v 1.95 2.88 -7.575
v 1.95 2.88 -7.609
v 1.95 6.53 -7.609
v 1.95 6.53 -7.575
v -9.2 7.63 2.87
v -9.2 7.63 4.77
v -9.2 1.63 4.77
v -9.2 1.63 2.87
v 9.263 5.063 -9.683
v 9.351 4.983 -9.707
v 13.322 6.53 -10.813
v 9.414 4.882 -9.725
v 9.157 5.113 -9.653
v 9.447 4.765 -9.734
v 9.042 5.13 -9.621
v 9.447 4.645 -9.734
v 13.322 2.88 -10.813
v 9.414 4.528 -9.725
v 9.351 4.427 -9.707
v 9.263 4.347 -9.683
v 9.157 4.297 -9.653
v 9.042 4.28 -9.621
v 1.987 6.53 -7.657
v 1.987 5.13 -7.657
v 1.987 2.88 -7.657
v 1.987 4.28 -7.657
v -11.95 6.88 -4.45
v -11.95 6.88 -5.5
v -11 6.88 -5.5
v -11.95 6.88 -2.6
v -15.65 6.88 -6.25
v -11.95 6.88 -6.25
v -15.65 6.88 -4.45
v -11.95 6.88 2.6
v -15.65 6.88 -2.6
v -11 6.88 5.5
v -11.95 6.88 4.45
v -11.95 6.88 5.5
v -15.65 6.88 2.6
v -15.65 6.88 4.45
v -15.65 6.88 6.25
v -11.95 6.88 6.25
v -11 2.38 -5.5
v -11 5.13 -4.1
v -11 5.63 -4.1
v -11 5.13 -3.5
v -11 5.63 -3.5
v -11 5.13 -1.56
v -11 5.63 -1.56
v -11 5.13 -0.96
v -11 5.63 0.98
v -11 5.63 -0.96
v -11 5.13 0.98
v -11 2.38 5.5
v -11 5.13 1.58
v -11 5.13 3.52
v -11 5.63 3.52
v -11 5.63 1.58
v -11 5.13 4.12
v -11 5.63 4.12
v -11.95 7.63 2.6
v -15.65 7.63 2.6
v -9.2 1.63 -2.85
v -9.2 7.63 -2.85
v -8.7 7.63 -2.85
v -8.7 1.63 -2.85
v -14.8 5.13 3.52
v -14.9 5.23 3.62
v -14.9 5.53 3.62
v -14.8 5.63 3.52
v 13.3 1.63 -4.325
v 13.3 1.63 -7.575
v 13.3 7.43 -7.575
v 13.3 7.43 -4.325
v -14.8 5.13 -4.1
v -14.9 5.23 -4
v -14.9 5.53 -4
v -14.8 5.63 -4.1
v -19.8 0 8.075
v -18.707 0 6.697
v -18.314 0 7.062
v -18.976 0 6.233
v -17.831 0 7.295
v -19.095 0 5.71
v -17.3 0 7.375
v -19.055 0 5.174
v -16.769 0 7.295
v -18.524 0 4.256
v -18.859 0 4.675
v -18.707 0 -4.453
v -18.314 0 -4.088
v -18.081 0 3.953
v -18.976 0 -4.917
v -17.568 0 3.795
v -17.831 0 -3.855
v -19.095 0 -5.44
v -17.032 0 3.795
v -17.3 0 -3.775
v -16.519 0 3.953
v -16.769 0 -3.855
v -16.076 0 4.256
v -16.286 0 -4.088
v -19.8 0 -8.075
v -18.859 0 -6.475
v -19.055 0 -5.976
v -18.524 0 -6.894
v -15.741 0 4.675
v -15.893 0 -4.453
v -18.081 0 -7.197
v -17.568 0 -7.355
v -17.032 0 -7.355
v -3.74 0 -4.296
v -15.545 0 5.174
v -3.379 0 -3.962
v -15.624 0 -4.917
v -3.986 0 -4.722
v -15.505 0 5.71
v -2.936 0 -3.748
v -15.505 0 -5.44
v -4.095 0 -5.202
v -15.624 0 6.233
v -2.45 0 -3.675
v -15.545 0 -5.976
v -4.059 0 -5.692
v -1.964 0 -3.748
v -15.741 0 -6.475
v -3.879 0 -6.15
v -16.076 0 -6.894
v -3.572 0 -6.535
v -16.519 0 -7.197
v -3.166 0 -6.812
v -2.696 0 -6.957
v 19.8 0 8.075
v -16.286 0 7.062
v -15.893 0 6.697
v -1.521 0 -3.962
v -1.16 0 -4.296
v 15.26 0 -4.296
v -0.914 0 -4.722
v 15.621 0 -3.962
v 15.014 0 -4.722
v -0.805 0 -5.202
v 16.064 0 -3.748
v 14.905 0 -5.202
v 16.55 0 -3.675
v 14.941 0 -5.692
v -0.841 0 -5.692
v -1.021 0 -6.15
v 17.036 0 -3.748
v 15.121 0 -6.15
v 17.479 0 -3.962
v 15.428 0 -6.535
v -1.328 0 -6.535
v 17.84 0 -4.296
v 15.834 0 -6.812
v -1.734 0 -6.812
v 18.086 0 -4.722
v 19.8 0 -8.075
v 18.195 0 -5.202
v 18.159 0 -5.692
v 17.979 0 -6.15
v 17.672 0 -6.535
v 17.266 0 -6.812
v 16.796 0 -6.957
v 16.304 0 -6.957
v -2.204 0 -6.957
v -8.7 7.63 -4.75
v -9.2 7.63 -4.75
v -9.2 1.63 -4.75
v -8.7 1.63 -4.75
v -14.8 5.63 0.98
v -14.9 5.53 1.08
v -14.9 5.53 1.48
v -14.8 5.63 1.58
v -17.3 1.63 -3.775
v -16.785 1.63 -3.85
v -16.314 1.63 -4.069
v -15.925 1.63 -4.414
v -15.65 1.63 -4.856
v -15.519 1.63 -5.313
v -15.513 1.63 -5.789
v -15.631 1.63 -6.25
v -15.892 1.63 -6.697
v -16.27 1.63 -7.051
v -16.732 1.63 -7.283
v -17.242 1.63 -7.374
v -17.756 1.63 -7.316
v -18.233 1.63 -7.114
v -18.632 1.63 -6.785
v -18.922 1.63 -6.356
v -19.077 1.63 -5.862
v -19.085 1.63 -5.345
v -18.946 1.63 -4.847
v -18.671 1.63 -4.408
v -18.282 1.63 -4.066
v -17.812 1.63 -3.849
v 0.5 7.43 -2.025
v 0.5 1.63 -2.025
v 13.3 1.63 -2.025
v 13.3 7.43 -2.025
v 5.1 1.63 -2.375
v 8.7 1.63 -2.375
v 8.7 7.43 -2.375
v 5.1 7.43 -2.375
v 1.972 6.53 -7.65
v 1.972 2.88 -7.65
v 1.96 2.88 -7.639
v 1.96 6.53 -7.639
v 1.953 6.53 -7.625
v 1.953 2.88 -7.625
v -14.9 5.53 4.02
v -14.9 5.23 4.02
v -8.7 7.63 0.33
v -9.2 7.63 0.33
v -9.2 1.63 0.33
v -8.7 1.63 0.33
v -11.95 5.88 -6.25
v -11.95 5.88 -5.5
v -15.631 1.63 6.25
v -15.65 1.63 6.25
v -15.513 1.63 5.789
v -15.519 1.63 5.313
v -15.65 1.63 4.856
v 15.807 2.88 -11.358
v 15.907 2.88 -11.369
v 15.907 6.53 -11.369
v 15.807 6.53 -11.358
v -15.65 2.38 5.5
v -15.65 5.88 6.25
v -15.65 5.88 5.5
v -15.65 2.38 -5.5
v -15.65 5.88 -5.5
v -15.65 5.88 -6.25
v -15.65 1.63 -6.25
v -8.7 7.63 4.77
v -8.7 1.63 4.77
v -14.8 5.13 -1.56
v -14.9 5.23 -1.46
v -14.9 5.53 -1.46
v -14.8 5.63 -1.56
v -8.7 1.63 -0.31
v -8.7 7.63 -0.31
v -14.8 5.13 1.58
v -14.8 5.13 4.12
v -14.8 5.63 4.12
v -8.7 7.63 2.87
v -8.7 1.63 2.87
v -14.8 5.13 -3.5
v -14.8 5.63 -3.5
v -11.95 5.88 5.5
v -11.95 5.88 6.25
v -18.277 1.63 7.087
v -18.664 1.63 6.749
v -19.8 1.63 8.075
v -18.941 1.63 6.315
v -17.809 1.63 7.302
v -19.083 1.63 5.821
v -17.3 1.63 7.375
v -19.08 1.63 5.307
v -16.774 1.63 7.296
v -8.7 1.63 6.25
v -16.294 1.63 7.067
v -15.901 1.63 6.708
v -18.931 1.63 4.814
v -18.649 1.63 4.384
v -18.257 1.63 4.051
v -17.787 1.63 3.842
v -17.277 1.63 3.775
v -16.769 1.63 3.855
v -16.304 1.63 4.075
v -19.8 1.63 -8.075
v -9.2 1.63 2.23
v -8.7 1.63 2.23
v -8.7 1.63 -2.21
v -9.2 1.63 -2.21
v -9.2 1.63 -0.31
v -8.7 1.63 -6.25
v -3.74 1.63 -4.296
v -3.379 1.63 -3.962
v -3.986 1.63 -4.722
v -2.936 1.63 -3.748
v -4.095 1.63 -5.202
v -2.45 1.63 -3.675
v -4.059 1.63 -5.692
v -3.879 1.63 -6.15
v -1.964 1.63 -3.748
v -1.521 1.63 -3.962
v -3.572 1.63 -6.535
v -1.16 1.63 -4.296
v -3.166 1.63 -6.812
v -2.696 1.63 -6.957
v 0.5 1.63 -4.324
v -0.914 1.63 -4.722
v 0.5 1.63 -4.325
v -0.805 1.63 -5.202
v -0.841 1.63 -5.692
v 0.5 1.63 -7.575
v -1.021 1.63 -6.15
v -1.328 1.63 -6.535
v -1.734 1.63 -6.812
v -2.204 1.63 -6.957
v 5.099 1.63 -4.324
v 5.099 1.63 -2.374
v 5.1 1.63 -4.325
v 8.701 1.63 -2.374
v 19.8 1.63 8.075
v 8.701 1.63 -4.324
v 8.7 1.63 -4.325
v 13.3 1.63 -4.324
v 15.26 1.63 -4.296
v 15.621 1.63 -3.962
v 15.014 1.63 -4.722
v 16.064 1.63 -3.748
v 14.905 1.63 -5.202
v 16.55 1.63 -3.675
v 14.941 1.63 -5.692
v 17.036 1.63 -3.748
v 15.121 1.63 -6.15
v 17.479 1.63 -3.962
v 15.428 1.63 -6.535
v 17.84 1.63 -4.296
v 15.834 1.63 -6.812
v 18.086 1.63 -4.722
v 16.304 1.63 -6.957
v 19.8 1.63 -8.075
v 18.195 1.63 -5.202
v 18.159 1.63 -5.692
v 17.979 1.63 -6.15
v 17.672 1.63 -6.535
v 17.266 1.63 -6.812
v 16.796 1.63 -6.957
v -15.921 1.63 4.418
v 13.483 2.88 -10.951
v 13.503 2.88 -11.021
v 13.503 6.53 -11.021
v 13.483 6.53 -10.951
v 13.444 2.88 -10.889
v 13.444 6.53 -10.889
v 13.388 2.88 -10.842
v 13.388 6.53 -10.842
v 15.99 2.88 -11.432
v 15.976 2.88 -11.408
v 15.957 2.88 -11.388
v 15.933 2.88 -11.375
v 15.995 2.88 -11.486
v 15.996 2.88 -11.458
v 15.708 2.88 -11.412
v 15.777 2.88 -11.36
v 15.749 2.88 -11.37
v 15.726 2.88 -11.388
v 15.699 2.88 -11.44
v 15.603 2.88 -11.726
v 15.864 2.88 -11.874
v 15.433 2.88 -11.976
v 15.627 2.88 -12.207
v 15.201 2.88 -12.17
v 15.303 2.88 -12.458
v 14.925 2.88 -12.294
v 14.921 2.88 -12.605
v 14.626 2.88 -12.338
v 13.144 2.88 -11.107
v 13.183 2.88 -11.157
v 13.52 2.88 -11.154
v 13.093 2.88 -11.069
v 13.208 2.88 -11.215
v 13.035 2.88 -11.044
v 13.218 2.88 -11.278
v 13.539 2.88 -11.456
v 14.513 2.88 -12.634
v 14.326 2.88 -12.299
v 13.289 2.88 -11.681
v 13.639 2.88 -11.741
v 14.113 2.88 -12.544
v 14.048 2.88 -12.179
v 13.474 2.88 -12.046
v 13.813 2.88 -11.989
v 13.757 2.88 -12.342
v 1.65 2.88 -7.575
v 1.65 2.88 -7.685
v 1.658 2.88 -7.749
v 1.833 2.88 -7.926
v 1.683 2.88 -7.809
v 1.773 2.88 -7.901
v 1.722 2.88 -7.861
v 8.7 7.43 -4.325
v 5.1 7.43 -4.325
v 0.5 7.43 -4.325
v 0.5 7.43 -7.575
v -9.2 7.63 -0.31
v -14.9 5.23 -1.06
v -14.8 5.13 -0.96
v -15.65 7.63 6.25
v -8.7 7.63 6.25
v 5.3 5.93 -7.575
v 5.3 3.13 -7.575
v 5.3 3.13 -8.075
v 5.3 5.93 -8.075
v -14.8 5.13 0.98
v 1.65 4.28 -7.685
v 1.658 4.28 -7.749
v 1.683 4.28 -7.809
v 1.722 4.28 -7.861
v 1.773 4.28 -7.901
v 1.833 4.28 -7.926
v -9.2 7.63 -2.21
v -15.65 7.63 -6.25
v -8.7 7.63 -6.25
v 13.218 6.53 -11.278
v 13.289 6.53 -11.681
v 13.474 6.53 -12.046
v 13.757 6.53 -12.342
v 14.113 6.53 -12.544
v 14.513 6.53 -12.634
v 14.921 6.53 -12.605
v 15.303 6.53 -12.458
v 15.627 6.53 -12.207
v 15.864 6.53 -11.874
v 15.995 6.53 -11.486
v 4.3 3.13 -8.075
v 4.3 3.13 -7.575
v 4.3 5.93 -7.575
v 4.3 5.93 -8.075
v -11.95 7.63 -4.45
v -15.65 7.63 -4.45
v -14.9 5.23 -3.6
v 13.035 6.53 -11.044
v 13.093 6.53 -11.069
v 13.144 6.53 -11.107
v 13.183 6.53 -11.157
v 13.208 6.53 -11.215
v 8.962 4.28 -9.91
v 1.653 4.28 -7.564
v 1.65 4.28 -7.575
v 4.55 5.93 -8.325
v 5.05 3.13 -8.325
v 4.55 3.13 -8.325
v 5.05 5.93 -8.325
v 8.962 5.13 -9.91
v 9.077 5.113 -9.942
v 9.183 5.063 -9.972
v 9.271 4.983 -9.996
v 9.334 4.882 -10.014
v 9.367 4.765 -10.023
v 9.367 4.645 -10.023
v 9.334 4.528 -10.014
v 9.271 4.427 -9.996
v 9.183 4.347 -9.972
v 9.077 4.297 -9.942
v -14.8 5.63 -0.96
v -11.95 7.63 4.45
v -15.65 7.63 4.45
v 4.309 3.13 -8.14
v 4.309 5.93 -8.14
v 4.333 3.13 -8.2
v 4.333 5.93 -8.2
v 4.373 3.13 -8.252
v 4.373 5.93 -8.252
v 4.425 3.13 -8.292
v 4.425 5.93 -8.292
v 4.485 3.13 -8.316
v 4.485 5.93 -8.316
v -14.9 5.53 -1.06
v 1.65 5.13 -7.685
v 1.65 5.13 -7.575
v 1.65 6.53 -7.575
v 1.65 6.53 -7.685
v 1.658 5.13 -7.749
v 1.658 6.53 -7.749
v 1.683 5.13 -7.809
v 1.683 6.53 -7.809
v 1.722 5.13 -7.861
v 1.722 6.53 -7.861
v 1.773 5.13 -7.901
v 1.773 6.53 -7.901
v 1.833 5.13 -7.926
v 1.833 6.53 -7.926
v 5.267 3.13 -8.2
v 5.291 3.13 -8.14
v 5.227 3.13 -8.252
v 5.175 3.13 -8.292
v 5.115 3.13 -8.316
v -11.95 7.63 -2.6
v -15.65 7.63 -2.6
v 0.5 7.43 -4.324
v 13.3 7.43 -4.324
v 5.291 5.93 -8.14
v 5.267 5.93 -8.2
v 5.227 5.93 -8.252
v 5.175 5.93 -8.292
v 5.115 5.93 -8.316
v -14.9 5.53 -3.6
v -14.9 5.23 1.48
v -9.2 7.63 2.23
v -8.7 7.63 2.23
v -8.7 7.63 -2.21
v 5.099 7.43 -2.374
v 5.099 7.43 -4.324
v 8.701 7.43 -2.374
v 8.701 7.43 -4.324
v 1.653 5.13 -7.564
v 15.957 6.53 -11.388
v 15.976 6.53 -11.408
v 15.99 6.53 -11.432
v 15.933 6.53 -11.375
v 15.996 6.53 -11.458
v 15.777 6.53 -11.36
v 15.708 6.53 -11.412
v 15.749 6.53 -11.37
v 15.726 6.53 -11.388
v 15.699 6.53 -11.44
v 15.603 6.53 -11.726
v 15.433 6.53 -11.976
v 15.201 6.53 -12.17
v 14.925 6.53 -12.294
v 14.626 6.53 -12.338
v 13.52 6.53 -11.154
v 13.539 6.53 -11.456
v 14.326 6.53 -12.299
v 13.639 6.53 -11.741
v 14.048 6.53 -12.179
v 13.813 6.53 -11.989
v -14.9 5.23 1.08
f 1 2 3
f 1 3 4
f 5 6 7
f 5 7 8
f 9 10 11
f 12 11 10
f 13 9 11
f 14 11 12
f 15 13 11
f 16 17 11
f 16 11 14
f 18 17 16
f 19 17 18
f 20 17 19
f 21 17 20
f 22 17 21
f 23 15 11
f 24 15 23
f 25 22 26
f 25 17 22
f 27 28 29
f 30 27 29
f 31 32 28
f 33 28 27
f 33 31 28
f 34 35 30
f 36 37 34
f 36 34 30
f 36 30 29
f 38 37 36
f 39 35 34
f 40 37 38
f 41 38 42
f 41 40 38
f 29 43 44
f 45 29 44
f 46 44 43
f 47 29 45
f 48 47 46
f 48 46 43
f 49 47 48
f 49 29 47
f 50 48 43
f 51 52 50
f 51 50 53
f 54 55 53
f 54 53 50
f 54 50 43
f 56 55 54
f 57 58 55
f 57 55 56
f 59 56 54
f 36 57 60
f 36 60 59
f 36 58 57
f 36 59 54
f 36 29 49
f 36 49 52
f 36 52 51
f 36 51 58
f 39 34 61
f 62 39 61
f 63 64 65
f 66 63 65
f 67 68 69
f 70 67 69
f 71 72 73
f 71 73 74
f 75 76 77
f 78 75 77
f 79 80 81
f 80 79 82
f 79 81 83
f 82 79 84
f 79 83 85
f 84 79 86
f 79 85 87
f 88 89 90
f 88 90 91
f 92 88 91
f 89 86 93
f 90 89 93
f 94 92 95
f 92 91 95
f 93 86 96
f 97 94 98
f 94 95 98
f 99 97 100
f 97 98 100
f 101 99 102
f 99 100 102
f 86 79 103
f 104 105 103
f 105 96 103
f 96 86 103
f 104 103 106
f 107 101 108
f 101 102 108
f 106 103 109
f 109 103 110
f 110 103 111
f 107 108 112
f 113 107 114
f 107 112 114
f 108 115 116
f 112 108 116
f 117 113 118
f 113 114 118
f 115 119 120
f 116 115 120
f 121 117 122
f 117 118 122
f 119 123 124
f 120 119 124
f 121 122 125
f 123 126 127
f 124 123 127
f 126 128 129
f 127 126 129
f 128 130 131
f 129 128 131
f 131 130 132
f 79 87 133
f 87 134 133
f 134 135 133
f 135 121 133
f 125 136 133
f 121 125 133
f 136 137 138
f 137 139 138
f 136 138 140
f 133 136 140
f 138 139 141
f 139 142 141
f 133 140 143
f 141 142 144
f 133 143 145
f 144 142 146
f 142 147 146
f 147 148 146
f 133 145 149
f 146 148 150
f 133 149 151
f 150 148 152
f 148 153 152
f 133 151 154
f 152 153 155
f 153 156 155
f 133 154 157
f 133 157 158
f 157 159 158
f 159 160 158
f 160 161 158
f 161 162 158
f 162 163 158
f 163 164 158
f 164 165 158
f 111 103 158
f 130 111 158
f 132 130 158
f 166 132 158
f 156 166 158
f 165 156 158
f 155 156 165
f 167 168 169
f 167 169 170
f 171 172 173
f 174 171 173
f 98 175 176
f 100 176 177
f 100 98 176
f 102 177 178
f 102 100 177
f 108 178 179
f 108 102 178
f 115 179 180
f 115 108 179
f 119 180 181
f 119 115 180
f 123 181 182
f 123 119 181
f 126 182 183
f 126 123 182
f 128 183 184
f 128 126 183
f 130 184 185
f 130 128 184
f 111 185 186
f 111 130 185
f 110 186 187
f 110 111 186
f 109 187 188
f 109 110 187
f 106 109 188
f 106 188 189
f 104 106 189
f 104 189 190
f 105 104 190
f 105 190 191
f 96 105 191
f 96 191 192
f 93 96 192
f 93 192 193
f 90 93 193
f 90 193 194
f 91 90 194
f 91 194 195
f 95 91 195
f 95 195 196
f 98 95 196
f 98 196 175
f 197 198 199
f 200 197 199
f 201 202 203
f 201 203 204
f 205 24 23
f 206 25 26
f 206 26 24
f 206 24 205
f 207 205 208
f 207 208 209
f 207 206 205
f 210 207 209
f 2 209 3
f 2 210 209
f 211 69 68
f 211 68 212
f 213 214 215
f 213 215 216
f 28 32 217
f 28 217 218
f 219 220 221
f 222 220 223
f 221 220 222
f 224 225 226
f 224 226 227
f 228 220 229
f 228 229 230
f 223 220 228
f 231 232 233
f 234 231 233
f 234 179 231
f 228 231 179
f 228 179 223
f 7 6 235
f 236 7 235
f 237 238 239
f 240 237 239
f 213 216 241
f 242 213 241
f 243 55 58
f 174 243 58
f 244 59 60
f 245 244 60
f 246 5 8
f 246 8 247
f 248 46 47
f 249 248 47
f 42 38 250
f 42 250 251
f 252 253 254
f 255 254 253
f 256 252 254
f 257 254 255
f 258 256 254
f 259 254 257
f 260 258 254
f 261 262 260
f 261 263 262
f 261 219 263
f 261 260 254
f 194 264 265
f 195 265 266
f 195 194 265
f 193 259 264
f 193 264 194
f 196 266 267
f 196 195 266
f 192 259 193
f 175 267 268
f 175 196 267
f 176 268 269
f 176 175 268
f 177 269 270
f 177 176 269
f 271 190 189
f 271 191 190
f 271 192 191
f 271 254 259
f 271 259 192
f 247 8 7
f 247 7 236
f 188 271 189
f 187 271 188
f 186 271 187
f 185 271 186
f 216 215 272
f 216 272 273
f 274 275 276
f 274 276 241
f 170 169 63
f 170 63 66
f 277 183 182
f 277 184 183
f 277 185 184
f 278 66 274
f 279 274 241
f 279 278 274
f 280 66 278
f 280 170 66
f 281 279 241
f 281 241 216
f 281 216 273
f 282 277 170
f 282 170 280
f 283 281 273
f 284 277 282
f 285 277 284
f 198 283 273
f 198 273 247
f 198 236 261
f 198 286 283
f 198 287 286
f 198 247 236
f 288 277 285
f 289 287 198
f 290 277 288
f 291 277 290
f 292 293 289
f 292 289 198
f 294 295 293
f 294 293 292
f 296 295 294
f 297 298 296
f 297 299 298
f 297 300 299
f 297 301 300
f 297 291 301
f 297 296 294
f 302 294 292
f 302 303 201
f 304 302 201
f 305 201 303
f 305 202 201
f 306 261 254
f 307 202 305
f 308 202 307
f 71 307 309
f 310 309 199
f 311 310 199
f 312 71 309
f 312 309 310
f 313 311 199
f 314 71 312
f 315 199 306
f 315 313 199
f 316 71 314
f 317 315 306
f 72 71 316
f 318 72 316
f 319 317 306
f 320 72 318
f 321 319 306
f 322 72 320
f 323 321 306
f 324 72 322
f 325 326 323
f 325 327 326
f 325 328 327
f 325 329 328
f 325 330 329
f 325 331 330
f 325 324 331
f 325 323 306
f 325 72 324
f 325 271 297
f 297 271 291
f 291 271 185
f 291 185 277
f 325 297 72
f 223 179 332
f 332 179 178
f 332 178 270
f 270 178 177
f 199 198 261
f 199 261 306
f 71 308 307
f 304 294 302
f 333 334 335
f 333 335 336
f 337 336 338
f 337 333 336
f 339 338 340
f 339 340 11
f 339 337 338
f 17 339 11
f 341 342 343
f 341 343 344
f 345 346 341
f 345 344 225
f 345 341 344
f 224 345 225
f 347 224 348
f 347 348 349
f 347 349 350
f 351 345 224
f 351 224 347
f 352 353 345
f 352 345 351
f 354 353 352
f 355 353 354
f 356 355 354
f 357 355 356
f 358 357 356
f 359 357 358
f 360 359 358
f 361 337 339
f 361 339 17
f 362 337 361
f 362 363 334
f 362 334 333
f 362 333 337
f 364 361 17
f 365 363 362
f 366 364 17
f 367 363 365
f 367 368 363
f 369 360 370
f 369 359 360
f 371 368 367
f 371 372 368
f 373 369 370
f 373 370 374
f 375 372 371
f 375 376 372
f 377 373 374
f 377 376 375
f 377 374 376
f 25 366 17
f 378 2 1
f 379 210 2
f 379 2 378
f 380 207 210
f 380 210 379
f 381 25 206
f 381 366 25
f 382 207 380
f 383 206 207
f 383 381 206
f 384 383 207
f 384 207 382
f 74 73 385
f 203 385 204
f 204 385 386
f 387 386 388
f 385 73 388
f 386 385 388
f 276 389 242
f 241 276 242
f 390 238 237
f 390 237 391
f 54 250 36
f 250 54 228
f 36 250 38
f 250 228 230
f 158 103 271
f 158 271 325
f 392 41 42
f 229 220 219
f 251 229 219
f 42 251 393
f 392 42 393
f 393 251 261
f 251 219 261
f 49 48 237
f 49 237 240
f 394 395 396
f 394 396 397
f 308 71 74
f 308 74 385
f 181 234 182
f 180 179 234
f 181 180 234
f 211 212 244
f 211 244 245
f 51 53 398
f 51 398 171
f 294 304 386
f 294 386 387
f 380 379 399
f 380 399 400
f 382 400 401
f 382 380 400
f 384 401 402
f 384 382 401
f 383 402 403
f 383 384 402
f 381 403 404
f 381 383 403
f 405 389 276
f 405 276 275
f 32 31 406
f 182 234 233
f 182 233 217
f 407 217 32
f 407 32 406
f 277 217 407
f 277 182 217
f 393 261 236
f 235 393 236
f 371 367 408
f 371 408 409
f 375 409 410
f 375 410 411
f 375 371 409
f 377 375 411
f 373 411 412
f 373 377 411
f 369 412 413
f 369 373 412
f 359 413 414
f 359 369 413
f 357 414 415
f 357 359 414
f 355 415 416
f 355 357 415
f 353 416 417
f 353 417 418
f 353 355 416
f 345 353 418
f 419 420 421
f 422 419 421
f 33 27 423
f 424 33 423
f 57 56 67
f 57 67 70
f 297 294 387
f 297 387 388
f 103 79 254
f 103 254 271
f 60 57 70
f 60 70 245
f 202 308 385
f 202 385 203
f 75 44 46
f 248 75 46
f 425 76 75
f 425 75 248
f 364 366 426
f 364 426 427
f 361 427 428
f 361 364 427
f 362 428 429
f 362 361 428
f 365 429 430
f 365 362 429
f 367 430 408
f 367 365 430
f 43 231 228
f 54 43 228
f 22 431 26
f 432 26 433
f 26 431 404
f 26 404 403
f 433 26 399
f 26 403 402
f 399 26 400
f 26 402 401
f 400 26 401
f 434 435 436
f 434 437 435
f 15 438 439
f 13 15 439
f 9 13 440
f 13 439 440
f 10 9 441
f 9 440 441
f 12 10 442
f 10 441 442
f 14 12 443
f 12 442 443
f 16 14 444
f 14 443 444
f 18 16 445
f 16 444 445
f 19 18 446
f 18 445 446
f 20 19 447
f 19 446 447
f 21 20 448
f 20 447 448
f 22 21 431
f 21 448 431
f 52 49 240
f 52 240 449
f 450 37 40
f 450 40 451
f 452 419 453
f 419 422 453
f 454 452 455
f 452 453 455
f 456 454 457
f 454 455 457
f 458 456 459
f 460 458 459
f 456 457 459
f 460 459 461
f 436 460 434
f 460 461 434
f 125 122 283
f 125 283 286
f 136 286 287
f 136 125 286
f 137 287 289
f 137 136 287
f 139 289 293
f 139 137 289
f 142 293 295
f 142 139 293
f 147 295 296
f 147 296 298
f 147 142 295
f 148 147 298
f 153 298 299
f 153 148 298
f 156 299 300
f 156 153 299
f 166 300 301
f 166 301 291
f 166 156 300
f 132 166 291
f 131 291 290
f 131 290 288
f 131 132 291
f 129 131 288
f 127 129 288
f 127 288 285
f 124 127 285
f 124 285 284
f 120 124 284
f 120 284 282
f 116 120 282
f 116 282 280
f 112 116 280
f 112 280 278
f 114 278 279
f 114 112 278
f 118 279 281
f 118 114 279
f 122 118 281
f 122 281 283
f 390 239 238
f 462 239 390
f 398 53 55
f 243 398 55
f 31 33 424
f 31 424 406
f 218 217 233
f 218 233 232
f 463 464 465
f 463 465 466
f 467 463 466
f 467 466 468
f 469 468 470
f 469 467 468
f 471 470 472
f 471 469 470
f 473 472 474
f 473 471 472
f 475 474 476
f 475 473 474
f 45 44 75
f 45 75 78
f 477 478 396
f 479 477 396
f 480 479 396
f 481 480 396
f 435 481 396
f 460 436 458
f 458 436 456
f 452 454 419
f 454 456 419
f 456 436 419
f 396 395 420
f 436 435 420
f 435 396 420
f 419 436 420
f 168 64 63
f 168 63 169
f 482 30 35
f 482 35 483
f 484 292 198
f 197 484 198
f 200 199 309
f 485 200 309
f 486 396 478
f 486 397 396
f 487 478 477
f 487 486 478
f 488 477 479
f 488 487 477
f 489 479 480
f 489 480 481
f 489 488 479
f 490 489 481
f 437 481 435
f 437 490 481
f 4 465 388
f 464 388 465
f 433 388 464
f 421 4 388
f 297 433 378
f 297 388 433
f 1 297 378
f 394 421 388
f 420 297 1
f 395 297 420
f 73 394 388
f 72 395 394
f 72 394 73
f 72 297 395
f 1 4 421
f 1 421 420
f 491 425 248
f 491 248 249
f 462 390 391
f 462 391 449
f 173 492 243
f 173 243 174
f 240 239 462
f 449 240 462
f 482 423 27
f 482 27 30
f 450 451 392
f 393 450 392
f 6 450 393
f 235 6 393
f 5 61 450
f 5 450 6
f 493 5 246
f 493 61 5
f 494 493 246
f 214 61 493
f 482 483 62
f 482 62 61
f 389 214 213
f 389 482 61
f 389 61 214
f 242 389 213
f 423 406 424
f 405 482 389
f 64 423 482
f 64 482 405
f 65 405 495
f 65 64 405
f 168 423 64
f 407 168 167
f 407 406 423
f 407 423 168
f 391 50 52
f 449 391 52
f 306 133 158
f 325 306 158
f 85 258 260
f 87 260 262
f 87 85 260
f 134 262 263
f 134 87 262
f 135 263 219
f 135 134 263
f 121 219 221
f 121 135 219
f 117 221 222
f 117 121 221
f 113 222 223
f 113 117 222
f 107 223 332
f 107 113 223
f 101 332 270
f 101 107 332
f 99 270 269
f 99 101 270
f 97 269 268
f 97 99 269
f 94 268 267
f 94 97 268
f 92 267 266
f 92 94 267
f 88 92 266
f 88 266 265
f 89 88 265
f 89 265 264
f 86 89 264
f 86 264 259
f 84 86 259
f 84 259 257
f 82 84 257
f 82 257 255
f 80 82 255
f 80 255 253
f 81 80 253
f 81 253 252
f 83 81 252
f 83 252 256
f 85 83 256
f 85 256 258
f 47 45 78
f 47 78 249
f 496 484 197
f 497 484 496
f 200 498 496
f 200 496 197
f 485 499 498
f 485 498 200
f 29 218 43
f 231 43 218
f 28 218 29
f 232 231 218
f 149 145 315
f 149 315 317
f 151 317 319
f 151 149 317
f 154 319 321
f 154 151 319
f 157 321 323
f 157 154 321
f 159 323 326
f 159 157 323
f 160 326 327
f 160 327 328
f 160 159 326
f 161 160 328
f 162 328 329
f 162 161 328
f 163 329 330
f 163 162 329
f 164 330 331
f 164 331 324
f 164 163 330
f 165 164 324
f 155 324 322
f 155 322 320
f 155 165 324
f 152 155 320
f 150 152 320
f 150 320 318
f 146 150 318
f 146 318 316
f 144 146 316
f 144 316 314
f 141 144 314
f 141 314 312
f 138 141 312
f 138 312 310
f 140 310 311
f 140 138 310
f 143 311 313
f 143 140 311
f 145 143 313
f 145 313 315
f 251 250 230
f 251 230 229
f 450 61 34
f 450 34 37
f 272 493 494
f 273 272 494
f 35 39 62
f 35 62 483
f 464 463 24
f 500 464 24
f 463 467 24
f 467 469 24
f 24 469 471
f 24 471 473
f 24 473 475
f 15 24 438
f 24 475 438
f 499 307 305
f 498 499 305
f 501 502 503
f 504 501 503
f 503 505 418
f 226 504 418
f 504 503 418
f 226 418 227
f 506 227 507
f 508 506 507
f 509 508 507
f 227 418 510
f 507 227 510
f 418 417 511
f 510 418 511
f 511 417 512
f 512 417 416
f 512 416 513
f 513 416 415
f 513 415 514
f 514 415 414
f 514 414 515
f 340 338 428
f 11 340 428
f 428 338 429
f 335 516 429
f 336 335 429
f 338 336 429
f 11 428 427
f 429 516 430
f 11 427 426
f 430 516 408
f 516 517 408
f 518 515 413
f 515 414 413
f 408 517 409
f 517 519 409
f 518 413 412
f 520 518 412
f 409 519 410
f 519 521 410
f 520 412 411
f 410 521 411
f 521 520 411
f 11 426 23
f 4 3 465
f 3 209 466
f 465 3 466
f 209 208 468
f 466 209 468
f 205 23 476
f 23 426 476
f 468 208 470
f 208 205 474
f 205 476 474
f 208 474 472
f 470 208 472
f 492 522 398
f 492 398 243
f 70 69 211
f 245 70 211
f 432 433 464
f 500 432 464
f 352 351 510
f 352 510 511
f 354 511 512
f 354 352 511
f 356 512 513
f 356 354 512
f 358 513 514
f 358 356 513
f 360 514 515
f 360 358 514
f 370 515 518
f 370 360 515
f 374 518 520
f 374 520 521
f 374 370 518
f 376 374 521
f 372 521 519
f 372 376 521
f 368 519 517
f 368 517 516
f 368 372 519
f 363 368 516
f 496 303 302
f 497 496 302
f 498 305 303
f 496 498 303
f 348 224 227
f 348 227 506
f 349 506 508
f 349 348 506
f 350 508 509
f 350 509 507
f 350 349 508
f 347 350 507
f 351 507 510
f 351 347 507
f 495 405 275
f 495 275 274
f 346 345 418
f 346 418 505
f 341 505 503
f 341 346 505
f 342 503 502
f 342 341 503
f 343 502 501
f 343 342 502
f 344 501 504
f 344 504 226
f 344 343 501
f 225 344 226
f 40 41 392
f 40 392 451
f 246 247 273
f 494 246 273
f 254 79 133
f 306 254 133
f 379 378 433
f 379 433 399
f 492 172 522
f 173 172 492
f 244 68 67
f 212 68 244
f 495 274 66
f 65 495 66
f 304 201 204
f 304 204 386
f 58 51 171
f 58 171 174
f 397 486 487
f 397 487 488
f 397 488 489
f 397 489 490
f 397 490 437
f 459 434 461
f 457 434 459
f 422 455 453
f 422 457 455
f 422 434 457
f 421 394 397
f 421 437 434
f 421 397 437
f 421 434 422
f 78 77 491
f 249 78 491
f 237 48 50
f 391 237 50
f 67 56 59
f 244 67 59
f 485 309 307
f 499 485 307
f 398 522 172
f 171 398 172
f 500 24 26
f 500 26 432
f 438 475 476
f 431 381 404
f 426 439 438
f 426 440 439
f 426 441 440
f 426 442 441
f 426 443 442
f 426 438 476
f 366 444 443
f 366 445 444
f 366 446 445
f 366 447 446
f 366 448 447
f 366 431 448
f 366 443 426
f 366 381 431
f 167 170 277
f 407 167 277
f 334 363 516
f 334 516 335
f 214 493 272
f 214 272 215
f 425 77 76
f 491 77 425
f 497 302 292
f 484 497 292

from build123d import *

# Parameters (mm, degrees)
SKETCH1_W           = 39.6
SKETCH1_H           = 16.15
SKETCH1_R           = 1.8
SKETCH1_R_2         = 1.65
BOSS_EXTRUDE1_DEPTH = 1.63
SKETCH2_W           = 6.95
SKETCH2_H           = 12.5
BOSS_EXTRUDE2_DEPTH = 6
SKETCH3_W           = 11
SKETCH3_H           = 4.5
CUT_EXTRUDE1_DEPTH  = 4.65
SKETCH4_W           = 1.85
SKETCH4_H           = 0.75
SKETCH4_W_2         = 0.75
SKETCH4_H_2         = 1
CUT_EXTRUDE2_DEPTH  = 3.7
SKETCH5_W           = 0.5
SKETCH5_H           = 1.9
CUT_EXTRUDE3_DEPTH  = 6
SKETCH6_W           = 0.6
SKETCH6_H           = 0.5
BOSS_EXTRUDE3_DEPTH = 3.9
CHAMFER1_SIZE       = 0.1
BOSS_EXTRUDE4_DEPTH = 5.8
BOSS_EXTRUDE5_DEPTH = 5.8
SKETCH9_W           = 1
SKETCH9_H           = 2.8
BOSS_EXTRUDE6_DEPTH = 0.75
FILLET1_R           = 0.25
BOSS_EXTRUDE7_DEPTH = 3.65
CUT_EXTRUDE4_DEPTH  = 0.3


with BuildPart() as part:
    # Sketch1 → Boss-Extrude1 (new body)
    with BuildSketch(Plane(origin=(0, 0, 0), x_dir=(1, 0, 0), z_dir=(0, 1, 0))):
        Rectangle(SKETCH1_W, SKETCH1_H)
        with Locations(Location((-17.3, 5.575, 0), (0, 0, 270))):
            Circle(SKETCH1_R, mode=Mode.SUBTRACT)
        with Locations(Location((-17.3, -5.575, 0), (0, 0, 270))):
            Circle(SKETCH1_R, mode=Mode.SUBTRACT)
        with Locations(Location((-2.45, 5.325, 0), (0, 0, 270))):
            Circle(SKETCH1_R_2, mode=Mode.SUBTRACT)
        with Locations(Location((16.55, 5.325, 0), (0, 0, 270))):
            Circle(SKETCH1_R_2, mode=Mode.SUBTRACT)
    extrude(amount=BOSS_EXTRUDE1_DEPTH)

    # Sketch2 → Boss-Extrude2 (add)
    with BuildSketch(Plane(origin=(0, 1.63, 0), x_dir=(1, 0, 0), z_dir=(0, 1, 0))):
        with Locations((-12.175, 0)):
            Rectangle(SKETCH2_W, SKETCH2_H)
    extrude(amount=BOSS_EXTRUDE2_DEPTH)

    # Sketch3 → Cut-Extrude1 (cut)
    with BuildSketch(Plane.ZY.offset(15.65)):
        with Locations((0, 4.63)):
            Rectangle(SKETCH3_W, SKETCH3_H)
    extrude(amount=-CUT_EXTRUDE1_DEPTH, mode=Mode.SUBTRACT)

    # Sketch4 → Cut-Extrude2 (cut)
    with BuildSketch(Plane.ZY.offset(15.65)):
        with Locations((-3.525, 7.255)):
            Rectangle(SKETCH4_W, SKETCH4_H)
        with Locations((-5.875, 6.38)):
            Rectangle(SKETCH4_W_2, SKETCH4_H_2)
        with Locations((5.875, 6.38)):
            Rectangle(SKETCH4_W_2, SKETCH4_H_2)
        with Locations((3.525, 7.255)):
            Rectangle(SKETCH4_W, SKETCH4_H)
    extrude(amount=-CUT_EXTRUDE2_DEPTH, mode=Mode.SUBTRACT)

    # Sketch5 → Cut-Extrude3 (cut)
    with BuildSketch(Plane(origin=(0, 7.63, 0), x_dir=(1, 0, 0), z_dir=(0, 1, 0))):
        with Locations((-8.95, 3.8)):
            Rectangle(SKETCH5_W, SKETCH5_H)
        with Locations((-8.95, 1.26)):
            Rectangle(SKETCH5_W, SKETCH5_H)
        with Locations((-8.95, -1.28)):
            Rectangle(SKETCH5_W, SKETCH5_H)
        with Locations((-8.95, -3.82)):
            Rectangle(SKETCH5_W, SKETCH5_H)
    extrude(amount=-CUT_EXTRUDE3_DEPTH, mode=Mode.SUBTRACT)

    # Sketch6 → Boss-Extrude3 (add)
    with BuildSketch(Plane.ZY.offset(11)):
        with Locations((-3.8, 5.38)):
            Rectangle(SKETCH6_W, SKETCH6_H)
        with Locations((-1.26, 5.38)):
            Rectangle(SKETCH6_W, SKETCH6_H)
        with Locations((1.28, 5.38)):
            Rectangle(SKETCH6_W, SKETCH6_H)
        with Locations((3.82, 5.38)):
            Rectangle(SKETCH6_W, SKETCH6_H)
    extrude(amount=BOSS_EXTRUDE3_DEPTH)

    # Chamfer1
    chamfer1_edges = [part.edges().sort_by_distance(p)[0] for p in [
        (-14.9, 5.38, -4.1),
        (-14.9, 5.13, -3.8),
        (-14.9, 5.38, -3.5),
        (-14.9, 5.63, -3.8),
        (-14.9, 5.63, -1.26),
        (-14.9, 5.38, -1.56),
        (-14.9, 5.13, -1.26),
        (-14.9, 5.38, -0.96),
        (-14.9, 5.63, 1.28),
        (-14.9, 5.38, 0.98),
        (-14.9, 5.13, 1.28),
        (-14.9, 5.38, 1.58),
        (-14.9, 5.63, 3.82),
        (-14.9, 5.38, 3.52),
        (-14.9, 5.13, 3.82),
        (-14.9, 5.38, 4.12),
    ]]
    chamfer(chamfer1_edges, length=CHAMFER1_SIZE)

    # Sketch7 → Boss-Extrude4 (add)
    with BuildSketch(Plane(origin=(0, 1.63, 0), x_dir=(1, 0, 0), z_dir=(0, 1, 0))):
        Polygon((0.5, 7.575), (13.3, 7.575), (13.3, 4.325), (8.7, 4.325), (8.7, 2.375), (5.1, 2.375), (5.1, 4.325), (0.5, 4.325), align=None)
    extrude(amount=BOSS_EXTRUDE4_DEPTH)

    # Sketch8 → Boss-Extrude5 (add)
    with BuildSketch(Plane(origin=(0, 1.63, 0), x_dir=(1, 0, 0), z_dir=(0, 1, 0))):
        Polygon((0.5, 4.324), (0.5, 2.025), (13.3, 2.025), (13.3, 4.324), (8.701, 4.324), (8.701, 2.374), (5.099, 2.374), (5.099, 4.324), align=None)
    extrude(amount=BOSS_EXTRUDE5_DEPTH)

    # Sketch9 → Boss-Extrude6 (add)
    with BuildSketch(Plane(origin=(0, 0, -7.575), x_dir=(-1, 0, 0), z_dir=(0, 0, -1))):
        with Locations((-4.8, 4.53)):
            Rectangle(SKETCH9_W, SKETCH9_H)
    extrude(amount=BOSS_EXTRUDE6_DEPTH)

    # Fillet1
    fillet1_edges = [part.edges().sort_by_distance(p)[0] for p in [
        (4.3, 4.53, -8.325),
        (5.3, 4.53, -8.325),
    ]]
    fillet(fillet1_edges, radius=FILLET1_R)

    # Sketch10 → Boss-Extrude7 (add)
    with BuildSketch(Plane(origin=(0, 2.88, 0), x_dir=(1, 0, 0), z_dir=(0, 1, 0))):
        with BuildLine():
            ThreePointArc((1.986591762, 7.65728792), (1.960185355, 7.63936483), (1.95, 7.609119267))
            Line((1.95, 7.609119267), (1.95, 7.575))
            Line((1.95, 7.575), (1.65, 7.575))
            Line((1.65, 7.575), (1.65, 7.685085191))
            ThreePointArc((1.65, 7.685085191), (1.700926776, 7.836313004), (1.832958812, 7.925928458))
            Line((1.832958812, 7.925928458), (13.03488517, 11.044099284))
            ThreePointArc((13.03488517, 11.044099284), (13.164742187, 11.130893542), (13.217742469, 11.277818891))
            ThreePointArc((13.217742469, 11.277818891), (14.51265049, 12.6340191), (15.995064384, 11.485753085))
            ThreePointArc((15.995064384, 11.485753085), (15.976497018, 11.407856176), (15.906722272, 11.368560369))
            Line((15.906722272, 11.368560369), (15.806911036, 11.35844928))
            ThreePointArc((15.806911036, 11.35844928), (15.736894481, 11.377893571), (15.698527539, 11.439605615))
            ThreePointArc((15.698527539, 11.439605615), (14.474302897, 12.328608683), (13.520358774, 11.154282051))
            Line((13.520358774, 11.154282051), (13.502671925, 11.020626045))
            ThreePointArc((13.502671925, 11.020626045), (13.443534072, 10.889435933), (13.321873718, 10.812579642))
            Line((13.321873718, 10.812579642), (1.986591762, 7.65728792))
        make_face()
    extrude(amount=BOSS_EXTRUDE7_DEPTH)

    # Sketch11 → Cut-Extrude4 (cut)
    with BuildSketch(Plane(origin=(1.123559568, 0, -7.728459919), x_dir=(0.9633730670576666, 0, -0.26816475097951425), z_dir=(0.26816475097951425, 0, 0.9633730670576666))):
        with BuildLine():
            Line((0.466005992, 5.13), (8.136005992, 5.13))
            ThreePointArc((8.136005992, 5.13), (8.561005992, 4.705), (8.136005992, 4.28))
            Line((8.136005992, 4.28), (0.466005992, 4.28))
            Line((0.466005992, 4.28), (0.466005992, 5.13))
        make_face()
    extrude(amount=CUT_EXTRUDE4_DEPTH, mode=Mode.SUBTRACT)


solid = part.part
